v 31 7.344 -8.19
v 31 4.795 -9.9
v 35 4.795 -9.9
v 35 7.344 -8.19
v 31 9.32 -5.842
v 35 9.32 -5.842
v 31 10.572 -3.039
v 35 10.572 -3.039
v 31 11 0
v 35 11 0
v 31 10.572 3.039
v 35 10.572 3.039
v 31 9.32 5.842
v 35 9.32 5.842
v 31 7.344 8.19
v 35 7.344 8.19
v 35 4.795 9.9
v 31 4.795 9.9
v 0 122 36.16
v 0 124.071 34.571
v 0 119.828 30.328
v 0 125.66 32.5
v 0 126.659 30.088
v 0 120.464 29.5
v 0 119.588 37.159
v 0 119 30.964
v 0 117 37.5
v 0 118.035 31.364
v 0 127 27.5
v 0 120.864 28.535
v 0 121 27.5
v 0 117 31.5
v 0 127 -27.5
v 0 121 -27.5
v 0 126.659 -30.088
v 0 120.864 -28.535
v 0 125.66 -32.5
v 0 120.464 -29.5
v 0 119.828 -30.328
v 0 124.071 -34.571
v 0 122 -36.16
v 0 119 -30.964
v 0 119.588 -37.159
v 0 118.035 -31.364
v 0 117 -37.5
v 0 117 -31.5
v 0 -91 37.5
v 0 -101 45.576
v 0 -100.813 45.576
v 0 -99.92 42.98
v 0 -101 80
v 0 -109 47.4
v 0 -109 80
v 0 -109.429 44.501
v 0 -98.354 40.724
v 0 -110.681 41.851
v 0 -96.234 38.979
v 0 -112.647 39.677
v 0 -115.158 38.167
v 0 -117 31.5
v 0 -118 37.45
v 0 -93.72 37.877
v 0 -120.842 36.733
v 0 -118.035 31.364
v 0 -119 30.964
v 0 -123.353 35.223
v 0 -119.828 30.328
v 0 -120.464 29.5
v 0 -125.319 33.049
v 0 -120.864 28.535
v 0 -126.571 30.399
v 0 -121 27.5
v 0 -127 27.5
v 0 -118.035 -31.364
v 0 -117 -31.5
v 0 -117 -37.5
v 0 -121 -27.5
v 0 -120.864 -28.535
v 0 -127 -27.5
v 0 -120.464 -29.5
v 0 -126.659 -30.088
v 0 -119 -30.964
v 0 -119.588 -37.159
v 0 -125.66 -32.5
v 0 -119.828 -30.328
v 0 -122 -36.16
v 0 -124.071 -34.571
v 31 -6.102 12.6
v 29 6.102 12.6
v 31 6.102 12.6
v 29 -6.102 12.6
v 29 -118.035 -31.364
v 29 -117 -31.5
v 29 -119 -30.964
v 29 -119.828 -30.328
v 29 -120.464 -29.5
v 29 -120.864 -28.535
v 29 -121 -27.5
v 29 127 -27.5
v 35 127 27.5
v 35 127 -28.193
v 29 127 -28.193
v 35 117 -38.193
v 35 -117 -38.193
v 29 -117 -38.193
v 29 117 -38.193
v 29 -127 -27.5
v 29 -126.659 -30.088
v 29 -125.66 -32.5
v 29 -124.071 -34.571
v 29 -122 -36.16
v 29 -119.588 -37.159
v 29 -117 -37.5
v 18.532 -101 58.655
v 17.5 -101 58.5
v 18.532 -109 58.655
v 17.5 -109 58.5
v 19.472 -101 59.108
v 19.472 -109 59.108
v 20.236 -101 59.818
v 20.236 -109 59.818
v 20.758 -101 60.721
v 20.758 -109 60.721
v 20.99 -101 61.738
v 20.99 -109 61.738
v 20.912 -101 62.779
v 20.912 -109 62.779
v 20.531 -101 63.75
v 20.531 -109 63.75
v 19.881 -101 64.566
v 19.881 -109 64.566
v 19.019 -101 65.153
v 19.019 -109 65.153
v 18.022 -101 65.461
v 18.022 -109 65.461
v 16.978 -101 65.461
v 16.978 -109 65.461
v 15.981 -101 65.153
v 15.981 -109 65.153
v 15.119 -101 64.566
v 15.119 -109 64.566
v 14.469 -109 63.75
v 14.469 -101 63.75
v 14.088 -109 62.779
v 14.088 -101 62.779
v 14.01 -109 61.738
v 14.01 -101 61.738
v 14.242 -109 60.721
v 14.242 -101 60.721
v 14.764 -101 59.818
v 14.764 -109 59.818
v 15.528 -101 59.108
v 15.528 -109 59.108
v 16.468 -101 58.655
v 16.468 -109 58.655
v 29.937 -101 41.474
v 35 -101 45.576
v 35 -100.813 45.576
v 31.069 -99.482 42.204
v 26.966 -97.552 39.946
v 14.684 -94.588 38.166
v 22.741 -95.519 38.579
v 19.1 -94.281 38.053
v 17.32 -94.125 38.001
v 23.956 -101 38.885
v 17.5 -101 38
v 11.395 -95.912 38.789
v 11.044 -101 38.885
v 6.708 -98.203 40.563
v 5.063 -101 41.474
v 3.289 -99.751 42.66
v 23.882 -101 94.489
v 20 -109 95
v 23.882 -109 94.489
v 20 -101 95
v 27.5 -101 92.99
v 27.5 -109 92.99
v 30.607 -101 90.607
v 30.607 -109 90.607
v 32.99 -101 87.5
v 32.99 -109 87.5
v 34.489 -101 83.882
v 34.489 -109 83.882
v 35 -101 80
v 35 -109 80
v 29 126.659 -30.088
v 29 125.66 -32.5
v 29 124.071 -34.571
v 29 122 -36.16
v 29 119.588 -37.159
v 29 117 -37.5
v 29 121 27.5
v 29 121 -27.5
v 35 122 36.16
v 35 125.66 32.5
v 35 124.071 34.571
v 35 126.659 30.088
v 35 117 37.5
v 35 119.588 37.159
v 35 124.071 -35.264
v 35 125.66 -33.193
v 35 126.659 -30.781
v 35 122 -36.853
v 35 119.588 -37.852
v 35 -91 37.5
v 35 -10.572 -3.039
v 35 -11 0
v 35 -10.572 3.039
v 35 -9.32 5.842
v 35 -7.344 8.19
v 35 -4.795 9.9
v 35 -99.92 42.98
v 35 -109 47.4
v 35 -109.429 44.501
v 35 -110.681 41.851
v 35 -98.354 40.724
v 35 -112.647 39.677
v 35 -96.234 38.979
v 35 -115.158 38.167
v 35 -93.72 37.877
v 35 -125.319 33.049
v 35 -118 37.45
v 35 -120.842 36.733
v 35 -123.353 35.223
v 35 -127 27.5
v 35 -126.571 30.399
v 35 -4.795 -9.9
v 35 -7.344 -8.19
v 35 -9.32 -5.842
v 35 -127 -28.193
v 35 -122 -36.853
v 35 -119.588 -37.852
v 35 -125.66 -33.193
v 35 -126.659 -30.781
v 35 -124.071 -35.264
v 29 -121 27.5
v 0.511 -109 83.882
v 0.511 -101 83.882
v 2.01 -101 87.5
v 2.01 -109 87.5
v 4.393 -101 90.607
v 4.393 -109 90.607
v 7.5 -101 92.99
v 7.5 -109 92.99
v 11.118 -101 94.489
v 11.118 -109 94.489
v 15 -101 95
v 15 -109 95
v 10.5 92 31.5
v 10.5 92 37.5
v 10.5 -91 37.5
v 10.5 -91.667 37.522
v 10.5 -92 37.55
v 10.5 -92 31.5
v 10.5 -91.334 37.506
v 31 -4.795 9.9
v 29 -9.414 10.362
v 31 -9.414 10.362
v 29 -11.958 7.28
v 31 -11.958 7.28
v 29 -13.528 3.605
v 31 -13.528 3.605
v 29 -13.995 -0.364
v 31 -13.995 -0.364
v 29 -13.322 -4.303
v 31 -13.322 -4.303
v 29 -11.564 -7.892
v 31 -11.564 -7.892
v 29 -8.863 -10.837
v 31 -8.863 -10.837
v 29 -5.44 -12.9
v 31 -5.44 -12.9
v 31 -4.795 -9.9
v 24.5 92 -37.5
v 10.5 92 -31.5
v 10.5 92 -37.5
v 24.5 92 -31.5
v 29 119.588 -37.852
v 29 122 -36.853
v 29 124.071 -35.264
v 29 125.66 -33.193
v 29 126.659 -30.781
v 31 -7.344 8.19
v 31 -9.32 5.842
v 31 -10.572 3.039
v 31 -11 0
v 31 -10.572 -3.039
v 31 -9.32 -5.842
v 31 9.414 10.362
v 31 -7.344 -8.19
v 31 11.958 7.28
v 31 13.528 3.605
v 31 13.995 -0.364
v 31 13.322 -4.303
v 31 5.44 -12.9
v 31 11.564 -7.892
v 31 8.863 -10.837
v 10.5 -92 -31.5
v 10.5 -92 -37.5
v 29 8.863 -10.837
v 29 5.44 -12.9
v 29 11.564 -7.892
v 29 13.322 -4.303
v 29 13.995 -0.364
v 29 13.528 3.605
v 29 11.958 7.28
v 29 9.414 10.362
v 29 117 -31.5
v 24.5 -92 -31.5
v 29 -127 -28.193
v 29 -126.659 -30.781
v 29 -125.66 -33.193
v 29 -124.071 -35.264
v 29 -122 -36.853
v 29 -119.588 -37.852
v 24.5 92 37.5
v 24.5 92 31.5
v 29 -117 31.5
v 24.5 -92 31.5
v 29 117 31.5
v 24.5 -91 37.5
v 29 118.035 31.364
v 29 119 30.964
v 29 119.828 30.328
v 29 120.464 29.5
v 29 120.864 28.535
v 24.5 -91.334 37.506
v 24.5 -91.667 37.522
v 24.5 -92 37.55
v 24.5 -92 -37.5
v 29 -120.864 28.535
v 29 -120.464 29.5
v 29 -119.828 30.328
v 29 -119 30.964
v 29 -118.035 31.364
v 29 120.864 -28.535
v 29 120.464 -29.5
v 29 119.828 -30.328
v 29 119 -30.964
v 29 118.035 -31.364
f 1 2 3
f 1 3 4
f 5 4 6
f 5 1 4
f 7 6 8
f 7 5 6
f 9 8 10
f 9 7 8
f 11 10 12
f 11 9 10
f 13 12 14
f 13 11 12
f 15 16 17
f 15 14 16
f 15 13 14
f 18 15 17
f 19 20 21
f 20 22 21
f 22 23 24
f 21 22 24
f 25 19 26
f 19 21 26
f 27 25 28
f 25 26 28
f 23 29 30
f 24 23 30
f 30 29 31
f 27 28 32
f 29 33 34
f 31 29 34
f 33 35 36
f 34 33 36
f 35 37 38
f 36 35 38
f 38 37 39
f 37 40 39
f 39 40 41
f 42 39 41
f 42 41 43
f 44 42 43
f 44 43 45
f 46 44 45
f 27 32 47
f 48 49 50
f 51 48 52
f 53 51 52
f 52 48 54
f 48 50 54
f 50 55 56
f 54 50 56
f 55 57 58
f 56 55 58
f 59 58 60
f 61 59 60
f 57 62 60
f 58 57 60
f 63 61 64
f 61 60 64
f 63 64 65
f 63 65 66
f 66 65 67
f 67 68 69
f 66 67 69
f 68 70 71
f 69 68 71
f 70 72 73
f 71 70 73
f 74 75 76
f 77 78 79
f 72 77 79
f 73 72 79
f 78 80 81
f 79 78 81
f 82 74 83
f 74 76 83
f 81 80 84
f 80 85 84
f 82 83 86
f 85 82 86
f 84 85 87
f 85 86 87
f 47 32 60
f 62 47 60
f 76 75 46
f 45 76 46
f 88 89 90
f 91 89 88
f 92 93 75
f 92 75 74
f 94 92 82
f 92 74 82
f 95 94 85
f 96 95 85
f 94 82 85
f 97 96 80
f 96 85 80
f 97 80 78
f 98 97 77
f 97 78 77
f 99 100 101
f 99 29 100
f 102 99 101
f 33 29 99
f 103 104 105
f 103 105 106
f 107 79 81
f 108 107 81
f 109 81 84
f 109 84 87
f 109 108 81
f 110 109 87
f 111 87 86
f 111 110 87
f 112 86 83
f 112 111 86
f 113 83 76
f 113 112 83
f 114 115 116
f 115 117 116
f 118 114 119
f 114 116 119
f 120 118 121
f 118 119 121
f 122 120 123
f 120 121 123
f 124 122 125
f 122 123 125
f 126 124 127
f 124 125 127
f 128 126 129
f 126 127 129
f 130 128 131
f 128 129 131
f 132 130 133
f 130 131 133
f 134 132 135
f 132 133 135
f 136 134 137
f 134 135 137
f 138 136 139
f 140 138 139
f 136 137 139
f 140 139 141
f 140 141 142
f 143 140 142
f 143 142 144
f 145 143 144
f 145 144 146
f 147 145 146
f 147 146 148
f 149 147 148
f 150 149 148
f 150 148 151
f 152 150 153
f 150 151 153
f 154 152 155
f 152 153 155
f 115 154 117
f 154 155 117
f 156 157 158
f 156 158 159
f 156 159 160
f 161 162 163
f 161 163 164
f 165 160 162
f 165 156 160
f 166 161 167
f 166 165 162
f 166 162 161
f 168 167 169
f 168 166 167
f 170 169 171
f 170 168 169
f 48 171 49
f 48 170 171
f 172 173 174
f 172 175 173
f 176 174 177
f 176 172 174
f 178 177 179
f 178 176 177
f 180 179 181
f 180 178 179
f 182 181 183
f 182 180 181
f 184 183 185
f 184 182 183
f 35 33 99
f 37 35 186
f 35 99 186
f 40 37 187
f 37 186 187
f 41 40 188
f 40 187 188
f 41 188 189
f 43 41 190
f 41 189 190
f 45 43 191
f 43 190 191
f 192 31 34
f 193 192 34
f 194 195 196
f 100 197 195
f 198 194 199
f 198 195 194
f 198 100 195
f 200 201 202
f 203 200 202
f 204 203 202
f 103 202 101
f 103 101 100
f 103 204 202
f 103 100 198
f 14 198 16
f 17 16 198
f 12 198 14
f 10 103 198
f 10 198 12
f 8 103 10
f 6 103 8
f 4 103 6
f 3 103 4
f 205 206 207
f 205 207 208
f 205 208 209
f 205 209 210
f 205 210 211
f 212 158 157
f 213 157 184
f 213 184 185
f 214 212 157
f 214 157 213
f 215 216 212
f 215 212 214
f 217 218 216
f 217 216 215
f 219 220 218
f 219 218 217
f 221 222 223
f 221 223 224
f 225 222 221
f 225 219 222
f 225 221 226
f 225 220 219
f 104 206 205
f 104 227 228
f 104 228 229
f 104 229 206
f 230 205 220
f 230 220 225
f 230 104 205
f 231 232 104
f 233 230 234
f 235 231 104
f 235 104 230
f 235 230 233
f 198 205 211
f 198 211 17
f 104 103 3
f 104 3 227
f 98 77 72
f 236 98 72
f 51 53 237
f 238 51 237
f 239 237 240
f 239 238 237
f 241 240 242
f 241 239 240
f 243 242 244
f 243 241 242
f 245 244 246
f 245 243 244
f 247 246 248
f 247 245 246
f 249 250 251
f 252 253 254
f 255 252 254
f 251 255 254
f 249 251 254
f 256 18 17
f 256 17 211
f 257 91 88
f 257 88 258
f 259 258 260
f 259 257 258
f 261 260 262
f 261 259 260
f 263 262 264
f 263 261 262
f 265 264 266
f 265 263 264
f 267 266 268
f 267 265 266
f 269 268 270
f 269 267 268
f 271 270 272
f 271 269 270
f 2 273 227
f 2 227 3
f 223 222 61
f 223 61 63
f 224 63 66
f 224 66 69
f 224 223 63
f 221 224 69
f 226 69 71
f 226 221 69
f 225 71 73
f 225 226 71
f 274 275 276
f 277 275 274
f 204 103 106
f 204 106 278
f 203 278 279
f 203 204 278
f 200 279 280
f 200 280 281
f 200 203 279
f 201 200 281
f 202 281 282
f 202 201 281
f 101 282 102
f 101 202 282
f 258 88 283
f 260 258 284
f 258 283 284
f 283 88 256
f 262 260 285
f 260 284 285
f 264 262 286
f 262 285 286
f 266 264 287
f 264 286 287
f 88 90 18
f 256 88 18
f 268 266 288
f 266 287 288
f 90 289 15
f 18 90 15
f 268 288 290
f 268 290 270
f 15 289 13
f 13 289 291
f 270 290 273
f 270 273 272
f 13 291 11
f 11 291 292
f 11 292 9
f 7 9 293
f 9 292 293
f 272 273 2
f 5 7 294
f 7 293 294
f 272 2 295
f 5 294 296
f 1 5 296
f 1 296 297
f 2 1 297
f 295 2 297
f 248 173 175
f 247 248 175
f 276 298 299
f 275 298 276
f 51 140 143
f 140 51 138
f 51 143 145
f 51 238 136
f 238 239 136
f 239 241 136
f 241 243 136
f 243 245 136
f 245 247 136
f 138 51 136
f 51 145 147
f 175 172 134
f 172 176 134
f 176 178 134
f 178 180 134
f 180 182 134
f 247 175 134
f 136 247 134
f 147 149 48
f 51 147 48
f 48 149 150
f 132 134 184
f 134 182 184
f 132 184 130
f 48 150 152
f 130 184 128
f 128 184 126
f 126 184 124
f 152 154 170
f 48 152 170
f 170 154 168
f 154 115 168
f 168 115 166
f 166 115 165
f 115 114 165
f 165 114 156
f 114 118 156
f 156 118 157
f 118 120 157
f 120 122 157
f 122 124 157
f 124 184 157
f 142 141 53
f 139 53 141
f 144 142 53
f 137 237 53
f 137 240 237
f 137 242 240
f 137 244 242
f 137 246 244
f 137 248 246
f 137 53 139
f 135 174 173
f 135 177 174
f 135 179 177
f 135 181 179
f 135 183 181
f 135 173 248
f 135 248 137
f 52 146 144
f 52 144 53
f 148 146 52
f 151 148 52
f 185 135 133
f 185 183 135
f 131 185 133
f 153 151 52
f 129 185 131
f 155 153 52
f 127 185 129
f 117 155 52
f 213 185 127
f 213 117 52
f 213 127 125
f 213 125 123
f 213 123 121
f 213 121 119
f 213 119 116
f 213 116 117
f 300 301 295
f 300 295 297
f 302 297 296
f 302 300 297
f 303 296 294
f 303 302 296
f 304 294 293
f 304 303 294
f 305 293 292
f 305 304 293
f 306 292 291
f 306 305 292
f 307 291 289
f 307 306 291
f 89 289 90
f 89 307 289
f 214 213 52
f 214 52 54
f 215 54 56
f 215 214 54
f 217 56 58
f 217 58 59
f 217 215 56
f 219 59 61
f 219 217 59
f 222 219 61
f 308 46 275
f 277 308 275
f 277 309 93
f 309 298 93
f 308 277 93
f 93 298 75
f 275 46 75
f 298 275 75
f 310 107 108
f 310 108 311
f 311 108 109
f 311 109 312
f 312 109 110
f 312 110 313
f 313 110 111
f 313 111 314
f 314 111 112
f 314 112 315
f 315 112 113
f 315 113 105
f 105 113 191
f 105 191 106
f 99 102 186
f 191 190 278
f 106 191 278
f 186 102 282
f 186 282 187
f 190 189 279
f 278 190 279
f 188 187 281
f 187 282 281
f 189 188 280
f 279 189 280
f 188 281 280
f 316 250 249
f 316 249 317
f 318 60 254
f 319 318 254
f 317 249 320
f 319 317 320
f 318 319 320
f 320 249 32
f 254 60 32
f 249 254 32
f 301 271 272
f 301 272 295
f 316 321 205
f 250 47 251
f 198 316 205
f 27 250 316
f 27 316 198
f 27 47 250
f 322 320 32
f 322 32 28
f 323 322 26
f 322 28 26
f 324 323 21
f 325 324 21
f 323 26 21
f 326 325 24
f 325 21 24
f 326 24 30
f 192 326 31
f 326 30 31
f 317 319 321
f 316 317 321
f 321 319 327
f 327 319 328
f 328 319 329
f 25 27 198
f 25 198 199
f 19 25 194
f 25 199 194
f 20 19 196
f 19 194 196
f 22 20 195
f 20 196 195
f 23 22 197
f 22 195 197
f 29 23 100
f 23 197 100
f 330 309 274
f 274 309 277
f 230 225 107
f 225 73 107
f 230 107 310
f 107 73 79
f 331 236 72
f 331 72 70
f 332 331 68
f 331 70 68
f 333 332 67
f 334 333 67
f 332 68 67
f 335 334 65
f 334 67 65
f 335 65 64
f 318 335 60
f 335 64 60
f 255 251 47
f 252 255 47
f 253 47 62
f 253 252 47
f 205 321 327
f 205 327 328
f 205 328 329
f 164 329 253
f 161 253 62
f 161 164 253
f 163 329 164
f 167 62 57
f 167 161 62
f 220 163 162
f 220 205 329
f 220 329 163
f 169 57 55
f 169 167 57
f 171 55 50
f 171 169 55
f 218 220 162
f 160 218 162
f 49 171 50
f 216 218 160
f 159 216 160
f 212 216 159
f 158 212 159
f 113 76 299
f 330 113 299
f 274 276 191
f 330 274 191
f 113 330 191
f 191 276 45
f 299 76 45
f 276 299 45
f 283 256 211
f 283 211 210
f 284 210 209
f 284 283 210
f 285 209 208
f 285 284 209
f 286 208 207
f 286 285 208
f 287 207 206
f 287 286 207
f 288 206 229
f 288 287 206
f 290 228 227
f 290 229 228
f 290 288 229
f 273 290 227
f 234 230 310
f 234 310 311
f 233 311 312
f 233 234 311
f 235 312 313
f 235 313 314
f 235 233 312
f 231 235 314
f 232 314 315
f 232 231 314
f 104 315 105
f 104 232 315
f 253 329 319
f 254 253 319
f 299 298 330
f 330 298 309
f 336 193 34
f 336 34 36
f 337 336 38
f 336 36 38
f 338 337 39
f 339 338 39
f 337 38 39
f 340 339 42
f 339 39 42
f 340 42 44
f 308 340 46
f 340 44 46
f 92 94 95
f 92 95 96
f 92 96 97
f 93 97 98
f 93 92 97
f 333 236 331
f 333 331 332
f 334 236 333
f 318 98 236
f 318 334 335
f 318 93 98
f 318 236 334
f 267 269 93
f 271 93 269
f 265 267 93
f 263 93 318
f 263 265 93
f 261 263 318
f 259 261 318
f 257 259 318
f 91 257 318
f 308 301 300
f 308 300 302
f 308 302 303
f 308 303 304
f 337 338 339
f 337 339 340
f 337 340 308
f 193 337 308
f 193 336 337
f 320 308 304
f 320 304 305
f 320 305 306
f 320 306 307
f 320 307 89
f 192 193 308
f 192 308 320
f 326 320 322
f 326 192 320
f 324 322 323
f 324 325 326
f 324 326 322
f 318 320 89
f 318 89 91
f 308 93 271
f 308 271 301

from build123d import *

# Parameters (mm, degrees)
SKETCH3_W                 = 75
SKETCH3_H                 = 254
BOSS_EXTRUDE2_DEPTH       = 35
SHELL2_T                  = -6
CUT_EXTRUDE1_DEPTH        = 2
CUT_EXTRUDE2_DEPTH        = 137.000919115
SKETCH6_W                 = 14
SKETCH6_H                 = 184
CUT_EXTRUDE3_DEPTH        = 152.58825812
FILLET1_R                 = 10
FILLET2_R                 = 5
SKETCH12_W                = 57.5
SKETCH12_H                = 8
BOSS_EXTRUDE4_DEPTH       = 35
FILLET5_R                 = 10
FILLET6_R                 = 15
M8X1_0_TAPPED_HOLE1_D     = 7
M8X1_0_TAPPED_HOLE1_DEPTH = 8
M8X1_0_TAPPED_HOLE1_TIP   = 2.103012167
SKETCH16_R                = 24
CUT_EXTRUDE4_DEPTH        = 91
BOSS_EXTRUDE5_DEPTH       = 6
CUT_EXTRUDE5_DEPTH        = 29


with BuildPart() as part:
    # Sketch3 → Boss-Extrude2 (new body)
    with BuildSketch(Plane(origin=(0, 0, 0), x_dir=(0, 0, -1), z_dir=(1, 0, 0))):
        Rectangle(SKETCH3_W, SKETCH3_H)
    extrude(amount=BOSS_EXTRUDE2_DEPTH)

    # Shell2
    shell2_openings = [part.faces().sort_by_distance(p)[0] for p in [
        (35, 0, 0),
    ]]
    offset(amount=SHELL2_T, openings=shell2_openings, kind=Kind.INTERSECTION)

    # Sketch4 → Cut-Extrude1 (cut)
    with BuildSketch(Plane(origin=(6, 0, 0), x_dir=(0, 0, -1), z_dir=(1, 0, 0))):
        with BuildLine():
            Line((12.9, -5.439669108), (12.9, 5.439669108))
            ThreePointArc((12.9, 5.439669108), (0.363761531, 13.9952734), (-12.6, 6.102458521))
            Line((-12.6, 6.102458521), (-12.6, -6.102458521))
            ThreePointArc((-12.6, -6.102458521), (0.363761531, -13.9952734), (12.9, -5.439669108))
        make_face()
    cut_extrude1 = extrude(amount=-CUT_EXTRUDE1_DEPTH, mode=Mode.SUBTRACT)

    # Sketch5 → Cut-Extrude2 (cut, through all)
    with BuildSketch(Plane(origin=(4, 0, 0), x_dir=(0, 0, -1), z_dir=(1, 0, 0))):
        with BuildLine():
            Line((9.9, -4.794788838), (9.9, 4.794788838))
            ThreePointArc((9.9, 4.794788838), (0, 11), (-9.9, 4.794788838))
            Line((-9.9, 4.794788838), (-9.9, -4.794788838))
            ThreePointArc((-9.9, -4.794788838), (0, -11), (9.9, -4.794788838))
        make_face()
    cut_extrude2 = extrude(amount=-CUT_EXTRUDE2_DEPTH, mode=Mode.SUBTRACT)

    # Sketch6 → Cut-Extrude3 (cut, through all)
    with BuildSketch(Plane.XY.offset(37.5)):
        with Locations((17.5, 0)):
            Rectangle(SKETCH6_W, SKETCH6_H)
    extrude(amount=-CUT_EXTRUDE3_DEPTH, mode=Mode.SUBTRACT)

    # Fillet1
    fillet1_edges = [part.edges().sort_by_distance(p)[0] for p in [
        (17.5, -127, -37.5),
        (17.5, -127, 37.5),
        (17.5, 127, 37.5),
        (17.5, 127, -37.5),
    ]]
    fillet(fillet1_edges, radius=FILLET1_R)

    # Fillet2
    fillet2_edges = [part.edges().sort_by_distance(p)[0] for p in [
        (20.5, -121, -31.5),
        (20.5, 121, -31.5),
        (20.5, 121, 31.5),
        (20.5, -121, 31.5),
    ]]
    fillet(fillet2_edges, radius=FILLET2_R)

    # Sketch12 → Boss-Extrude4 (add)
    with BuildSketch(Plane(origin=(35, 0, 0), x_dir=(0, 0, -1), z_dir=(1, 0, 0))):
        with Locations((-66.25, -105)):
            Rectangle(SKETCH12_W, SKETCH12_H)
    extrude(amount=-BOSS_EXTRUDE4_DEPTH)

    # Fillet5
    # the kernel refuses this fillet: 10 mm, written as the material it adds along each edge
    with BuildSketch(Plane(origin=(35, -109, 37.5), x_dir=(0, -0.9999844906159053, -0.0055694279462415305), z_dir=(-1, 0, 0))) as fillet5_piece_1:
        with BuildLine():
            CenterArc((9.944708969, 9.955289483), FILLET5_R, 180.319106365, 84.260829523)
            Line((-0.055135937, 9.899595203), (-1.055120428, 9.894025775))
            Line((-1.055120428, 9.894025775), (-0.999984491, -0.005569428))
            Line((-0.999984491, -0.005569428), (0.005569428, -0.999984491))
            ThreePointArc((0.005569428, -0.999984491), (8.005445353, -0.955429067), (8.905682648, -0.995528948))
            Line((8.905682648, -0.995528948), (9.000139587, 0))
        make_face()
    extrude(amount=35)
    with BuildSketch(Plane(origin=(35, -101, 37.5), x_dir=(0, 1, 0), z_dir=(-1, 0, 0))) as fillet5_piece_2_section:
        with BuildLine():
            CenterArc((FILLET5_R, -FILLET5_R), FILLET5_R, 90, 90)
            Line((0, -FILLET5_R), (0, 0))
            Line((0, 0), (FILLET5_R, 0))
        make_face()
    fillet5_piece_2 = extrude(amount=35, mode=Mode.PRIVATE)
    fillet5_piece_2 = split(fillet5_piece_2, bisect_by=Plane(origin=(29.75, -92, 37.408860849), z_dir=(0, 1, 0)), keep=Keep.TOP, mode=Mode.PRIVATE)
    fillet5_piece_2 = split(fillet5_piece_2, bisect_by=Plane(origin=(24.5, -91.519267155, 37.408860849), z_dir=(1, 0, 0)), keep=Keep.TOP, mode=Mode.PRIVATE)
    add(fillet5_piece_2)
    with BuildSketch(Plane(origin=(35, -101, 37.5), x_dir=(0, 1, 0), z_dir=(-1, 0, 0))) as fillet5_piece_3_section:
        with BuildLine():
            CenterArc((FILLET5_R, -FILLET5_R), FILLET5_R, 90, 90)
            Line((0, -FILLET5_R), (0, 0))
            Line((0, 0), (FILLET5_R, 0))
        make_face()
    fillet5_piece_3 = extrude(amount=35, mode=Mode.PRIVATE)
    fillet5_piece_3 = split(fillet5_piece_3, bisect_by=Plane(origin=(29.75, -92, 39.784135406), z_dir=(0, -1, 0)), keep=Keep.TOP, mode=Mode.PRIVATE)
    fillet5_piece_3 = split(fillet5_piece_3, bisect_by=Plane(origin=(24.5, -98.797900168, 39.784135406), z_dir=(1, 0, 0)), keep=Keep.TOP, mode=Mode.PRIVATE)
    add(fillet5_piece_3)
    with BuildSketch(Plane(origin=(35, -101, 37.5), x_dir=(0, 1, 0), z_dir=(-1, 0, 0))) as fillet5_piece_4_section:
        with BuildLine():
            CenterArc((FILLET5_R, -FILLET5_R), FILLET5_R, 90, 90)
            Line((0, -FILLET5_R), (0, 0))
            Line((0, 0), (FILLET5_R, 0))
        make_face()
    fillet5_piece_4 = extrude(amount=35, mode=Mode.PRIVATE)
    fillet5_piece_4 = split(fillet5_piece_4, bisect_by=Plane(origin=(10.5, -98.797900168, 39.784135406), z_dir=(1, 0, 0)), keep=Keep.TOP, mode=Mode.PRIVATE)
    fillet5_piece_4 = split(fillet5_piece_4, bisect_by=Plane(origin=(17.5, -92, 39.784135406), z_dir=(0, -1, 0)), keep=Keep.TOP, mode=Mode.PRIVATE)
    fillet5_piece_4 = split(fillet5_piece_4, bisect_by=Plane(origin=(24.5, -98.797900168, 39.784135406), z_dir=(-1, 0, 0)), keep=Keep.TOP, mode=Mode.PRIVATE)
    add(fillet5_piece_4)
    with BuildSketch(Plane(origin=(35, -101, 37.5), x_dir=(0, 1, 0), z_dir=(-1, 0, 0))) as fillet5_piece_5_section:
        with BuildLine():
            CenterArc((FILLET5_R, -FILLET5_R), FILLET5_R, 90, 90)
            Line((0, -FILLET5_R), (0, 0))
            Line((0, 0), (FILLET5_R, 0))
        make_face()
    fillet5_piece_5 = extrude(amount=35, mode=Mode.PRIVATE)
    fillet5_piece_5 = split(fillet5_piece_5, bisect_by=Plane(origin=(10.5, -91.519267155, 37.408860849), z_dir=(-1, 0, 0)), keep=Keep.TOP, mode=Mode.PRIVATE)
    fillet5_piece_5 = split(fillet5_piece_5, bisect_by=Plane(origin=(5.25, -92, 37.408860849), z_dir=(0, 1, 0)), keep=Keep.TOP, mode=Mode.PRIVATE)
    add(fillet5_piece_5)
    with BuildSketch(Plane(origin=(35, -101, 37.5), x_dir=(0, 1, 0), z_dir=(-1, 0, 0))) as fillet5_piece_6_section:
        with BuildLine():
            CenterArc((FILLET5_R, -FILLET5_R), FILLET5_R, 90, 90)
            Line((0, -FILLET5_R), (0, 0))
            Line((0, 0), (FILLET5_R, 0))
        make_face()
    fillet5_piece_6 = extrude(amount=35, mode=Mode.PRIVATE)
    fillet5_piece_6 = split(fillet5_piece_6, bisect_by=Plane(origin=(10.5, -98.797900168, 39.784135406), z_dir=(-1, 0, 0)), keep=Keep.TOP, mode=Mode.PRIVATE)
    fillet5_piece_6 = split(fillet5_piece_6, bisect_by=Plane(origin=(5.25, -92, 39.784135406), z_dir=(0, -1, 0)), keep=Keep.TOP, mode=Mode.PRIVATE)
    add(fillet5_piece_6)

    # Fillet6
    fillet6_edges = [part.edges().sort_by_distance(p)[0] for p in [
        (35, -105, 95),
        (0, -105, 95),
    ]]
    fillet(fillet6_edges, radius=FILLET6_R)

    # M8x1.0 Tapped Hole1
    with Locations(Plane(origin=(17.5, -101, 62), x_dir=(0, 0, 1), z_dir=(0, 1, 0))):
        with Locations((0, 0)):
            Hole(M8X1_0_TAPPED_HOLE1_D / 2, depth=M8X1_0_TAPPED_HOLE1_DEPTH)
            with Locations((0, 0, -(M8X1_0_TAPPED_HOLE1_DEPTH + M8X1_0_TAPPED_HOLE1_TIP / 2))):  # 118° drill point
                Cone(0, M8X1_0_TAPPED_HOLE1_D / 2, M8X1_0_TAPPED_HOLE1_TIP, mode=Mode.SUBTRACT)

    # Sketch16 → Cut-Extrude4 (cut)
    with BuildSketch(Plane(origin=(0, -101, 0), x_dir=(1, 0, 0), z_dir=(0, 1, 0))):
        with Locations((17.5, -62)):
            Circle(SKETCH16_R)
    extrude(amount=CUT_EXTRUDE4_DEPTH, mode=Mode.SUBTRACT)

    # Sketch17 → Boss-Extrude5 (add)
    with BuildSketch(Plane(origin=(35, 0, 0), x_dir=(0, 0, -1), z_dir=(1, 0, 0))):
        with BuildLine():
            Line((-26.806920407, -127), (28.193079593, -127))
            ThreePointArc((28.193079593, -127), (35.264147405, -124.071067812), (38.193079593, -117))
            Line((38.193079593, -117), (38.193079593, 117))
            ThreePointArc((38.193079593, 117), (35.264147405, 124.071067812), (28.193079593, 127))
            Line((28.193079593, 127), (-26.806920527, 127))
            ThreePointArc((-26.806920527, 127), (-33.878742431, 124.070313639), (-36.806920299, 116.997866992))
            Line((-36.806920299, 116.997866992), (-36.756795058, -117.999997222))
            ThreePointArc((-36.756795058, -117.999997222), (-33.515125375, -124.416197551), (-26.806920407, -127))
        make_face()
    extrude(amount=-BOSS_EXTRUDE5_DEPTH)

    # Mirror1: Cut-Extrude1, Cut-Extrude2 across plane
    add(cut_extrude1.mirror(Plane.ZY.offset(-17.5)), mode=Mode.SUBTRACT)
    add(cut_extrude2.mirror(Plane.ZY.offset(-17.5)), mode=Mode.SUBTRACT)

    # Sketch18 → Cut-Extrude5 (cut)
    with BuildSketch(Plane.ZY):
        with BuildLine():
            ThreePointArc((31.5, 117), (30.328427125, 119.828427125), (27.5, 121))
            Line((27.5, 121), (-27.5, 121))
            ThreePointArc((-27.5, 121), (-30.328427125, 119.828427125), (-31.5, 117))
            Line((-31.5, 117), (-31.5, -117))
            ThreePointArc((-31.5, -117), (-30.328427125, -119.828427125), (-27.5, -121))
            Line((-27.5, -121), (27.5, -121))
            ThreePointArc((27.5, -121), (30.328427125, -119.828427125), (31.5, -117))
            Line((31.5, -117), (31.5, 117))
        make_face()
        with BuildLine():
            Line((-9.9, -4.794788838), (-9.9, 4.794788838))
            ThreePointArc((-9.9, 4.794788838), (0, 11), (9.9, 4.794788838))
            Line((9.9, 4.794788838), (9.9, -4.794788838))
            ThreePointArc((9.9, -4.794788838), (0, -11), (-9.9, -4.794788838))
        make_face(mode=Mode.SUBTRACT)
    extrude(amount=-CUT_EXTRUDE5_DEPTH, mode=Mode.SUBTRACT)


solid = part.part
